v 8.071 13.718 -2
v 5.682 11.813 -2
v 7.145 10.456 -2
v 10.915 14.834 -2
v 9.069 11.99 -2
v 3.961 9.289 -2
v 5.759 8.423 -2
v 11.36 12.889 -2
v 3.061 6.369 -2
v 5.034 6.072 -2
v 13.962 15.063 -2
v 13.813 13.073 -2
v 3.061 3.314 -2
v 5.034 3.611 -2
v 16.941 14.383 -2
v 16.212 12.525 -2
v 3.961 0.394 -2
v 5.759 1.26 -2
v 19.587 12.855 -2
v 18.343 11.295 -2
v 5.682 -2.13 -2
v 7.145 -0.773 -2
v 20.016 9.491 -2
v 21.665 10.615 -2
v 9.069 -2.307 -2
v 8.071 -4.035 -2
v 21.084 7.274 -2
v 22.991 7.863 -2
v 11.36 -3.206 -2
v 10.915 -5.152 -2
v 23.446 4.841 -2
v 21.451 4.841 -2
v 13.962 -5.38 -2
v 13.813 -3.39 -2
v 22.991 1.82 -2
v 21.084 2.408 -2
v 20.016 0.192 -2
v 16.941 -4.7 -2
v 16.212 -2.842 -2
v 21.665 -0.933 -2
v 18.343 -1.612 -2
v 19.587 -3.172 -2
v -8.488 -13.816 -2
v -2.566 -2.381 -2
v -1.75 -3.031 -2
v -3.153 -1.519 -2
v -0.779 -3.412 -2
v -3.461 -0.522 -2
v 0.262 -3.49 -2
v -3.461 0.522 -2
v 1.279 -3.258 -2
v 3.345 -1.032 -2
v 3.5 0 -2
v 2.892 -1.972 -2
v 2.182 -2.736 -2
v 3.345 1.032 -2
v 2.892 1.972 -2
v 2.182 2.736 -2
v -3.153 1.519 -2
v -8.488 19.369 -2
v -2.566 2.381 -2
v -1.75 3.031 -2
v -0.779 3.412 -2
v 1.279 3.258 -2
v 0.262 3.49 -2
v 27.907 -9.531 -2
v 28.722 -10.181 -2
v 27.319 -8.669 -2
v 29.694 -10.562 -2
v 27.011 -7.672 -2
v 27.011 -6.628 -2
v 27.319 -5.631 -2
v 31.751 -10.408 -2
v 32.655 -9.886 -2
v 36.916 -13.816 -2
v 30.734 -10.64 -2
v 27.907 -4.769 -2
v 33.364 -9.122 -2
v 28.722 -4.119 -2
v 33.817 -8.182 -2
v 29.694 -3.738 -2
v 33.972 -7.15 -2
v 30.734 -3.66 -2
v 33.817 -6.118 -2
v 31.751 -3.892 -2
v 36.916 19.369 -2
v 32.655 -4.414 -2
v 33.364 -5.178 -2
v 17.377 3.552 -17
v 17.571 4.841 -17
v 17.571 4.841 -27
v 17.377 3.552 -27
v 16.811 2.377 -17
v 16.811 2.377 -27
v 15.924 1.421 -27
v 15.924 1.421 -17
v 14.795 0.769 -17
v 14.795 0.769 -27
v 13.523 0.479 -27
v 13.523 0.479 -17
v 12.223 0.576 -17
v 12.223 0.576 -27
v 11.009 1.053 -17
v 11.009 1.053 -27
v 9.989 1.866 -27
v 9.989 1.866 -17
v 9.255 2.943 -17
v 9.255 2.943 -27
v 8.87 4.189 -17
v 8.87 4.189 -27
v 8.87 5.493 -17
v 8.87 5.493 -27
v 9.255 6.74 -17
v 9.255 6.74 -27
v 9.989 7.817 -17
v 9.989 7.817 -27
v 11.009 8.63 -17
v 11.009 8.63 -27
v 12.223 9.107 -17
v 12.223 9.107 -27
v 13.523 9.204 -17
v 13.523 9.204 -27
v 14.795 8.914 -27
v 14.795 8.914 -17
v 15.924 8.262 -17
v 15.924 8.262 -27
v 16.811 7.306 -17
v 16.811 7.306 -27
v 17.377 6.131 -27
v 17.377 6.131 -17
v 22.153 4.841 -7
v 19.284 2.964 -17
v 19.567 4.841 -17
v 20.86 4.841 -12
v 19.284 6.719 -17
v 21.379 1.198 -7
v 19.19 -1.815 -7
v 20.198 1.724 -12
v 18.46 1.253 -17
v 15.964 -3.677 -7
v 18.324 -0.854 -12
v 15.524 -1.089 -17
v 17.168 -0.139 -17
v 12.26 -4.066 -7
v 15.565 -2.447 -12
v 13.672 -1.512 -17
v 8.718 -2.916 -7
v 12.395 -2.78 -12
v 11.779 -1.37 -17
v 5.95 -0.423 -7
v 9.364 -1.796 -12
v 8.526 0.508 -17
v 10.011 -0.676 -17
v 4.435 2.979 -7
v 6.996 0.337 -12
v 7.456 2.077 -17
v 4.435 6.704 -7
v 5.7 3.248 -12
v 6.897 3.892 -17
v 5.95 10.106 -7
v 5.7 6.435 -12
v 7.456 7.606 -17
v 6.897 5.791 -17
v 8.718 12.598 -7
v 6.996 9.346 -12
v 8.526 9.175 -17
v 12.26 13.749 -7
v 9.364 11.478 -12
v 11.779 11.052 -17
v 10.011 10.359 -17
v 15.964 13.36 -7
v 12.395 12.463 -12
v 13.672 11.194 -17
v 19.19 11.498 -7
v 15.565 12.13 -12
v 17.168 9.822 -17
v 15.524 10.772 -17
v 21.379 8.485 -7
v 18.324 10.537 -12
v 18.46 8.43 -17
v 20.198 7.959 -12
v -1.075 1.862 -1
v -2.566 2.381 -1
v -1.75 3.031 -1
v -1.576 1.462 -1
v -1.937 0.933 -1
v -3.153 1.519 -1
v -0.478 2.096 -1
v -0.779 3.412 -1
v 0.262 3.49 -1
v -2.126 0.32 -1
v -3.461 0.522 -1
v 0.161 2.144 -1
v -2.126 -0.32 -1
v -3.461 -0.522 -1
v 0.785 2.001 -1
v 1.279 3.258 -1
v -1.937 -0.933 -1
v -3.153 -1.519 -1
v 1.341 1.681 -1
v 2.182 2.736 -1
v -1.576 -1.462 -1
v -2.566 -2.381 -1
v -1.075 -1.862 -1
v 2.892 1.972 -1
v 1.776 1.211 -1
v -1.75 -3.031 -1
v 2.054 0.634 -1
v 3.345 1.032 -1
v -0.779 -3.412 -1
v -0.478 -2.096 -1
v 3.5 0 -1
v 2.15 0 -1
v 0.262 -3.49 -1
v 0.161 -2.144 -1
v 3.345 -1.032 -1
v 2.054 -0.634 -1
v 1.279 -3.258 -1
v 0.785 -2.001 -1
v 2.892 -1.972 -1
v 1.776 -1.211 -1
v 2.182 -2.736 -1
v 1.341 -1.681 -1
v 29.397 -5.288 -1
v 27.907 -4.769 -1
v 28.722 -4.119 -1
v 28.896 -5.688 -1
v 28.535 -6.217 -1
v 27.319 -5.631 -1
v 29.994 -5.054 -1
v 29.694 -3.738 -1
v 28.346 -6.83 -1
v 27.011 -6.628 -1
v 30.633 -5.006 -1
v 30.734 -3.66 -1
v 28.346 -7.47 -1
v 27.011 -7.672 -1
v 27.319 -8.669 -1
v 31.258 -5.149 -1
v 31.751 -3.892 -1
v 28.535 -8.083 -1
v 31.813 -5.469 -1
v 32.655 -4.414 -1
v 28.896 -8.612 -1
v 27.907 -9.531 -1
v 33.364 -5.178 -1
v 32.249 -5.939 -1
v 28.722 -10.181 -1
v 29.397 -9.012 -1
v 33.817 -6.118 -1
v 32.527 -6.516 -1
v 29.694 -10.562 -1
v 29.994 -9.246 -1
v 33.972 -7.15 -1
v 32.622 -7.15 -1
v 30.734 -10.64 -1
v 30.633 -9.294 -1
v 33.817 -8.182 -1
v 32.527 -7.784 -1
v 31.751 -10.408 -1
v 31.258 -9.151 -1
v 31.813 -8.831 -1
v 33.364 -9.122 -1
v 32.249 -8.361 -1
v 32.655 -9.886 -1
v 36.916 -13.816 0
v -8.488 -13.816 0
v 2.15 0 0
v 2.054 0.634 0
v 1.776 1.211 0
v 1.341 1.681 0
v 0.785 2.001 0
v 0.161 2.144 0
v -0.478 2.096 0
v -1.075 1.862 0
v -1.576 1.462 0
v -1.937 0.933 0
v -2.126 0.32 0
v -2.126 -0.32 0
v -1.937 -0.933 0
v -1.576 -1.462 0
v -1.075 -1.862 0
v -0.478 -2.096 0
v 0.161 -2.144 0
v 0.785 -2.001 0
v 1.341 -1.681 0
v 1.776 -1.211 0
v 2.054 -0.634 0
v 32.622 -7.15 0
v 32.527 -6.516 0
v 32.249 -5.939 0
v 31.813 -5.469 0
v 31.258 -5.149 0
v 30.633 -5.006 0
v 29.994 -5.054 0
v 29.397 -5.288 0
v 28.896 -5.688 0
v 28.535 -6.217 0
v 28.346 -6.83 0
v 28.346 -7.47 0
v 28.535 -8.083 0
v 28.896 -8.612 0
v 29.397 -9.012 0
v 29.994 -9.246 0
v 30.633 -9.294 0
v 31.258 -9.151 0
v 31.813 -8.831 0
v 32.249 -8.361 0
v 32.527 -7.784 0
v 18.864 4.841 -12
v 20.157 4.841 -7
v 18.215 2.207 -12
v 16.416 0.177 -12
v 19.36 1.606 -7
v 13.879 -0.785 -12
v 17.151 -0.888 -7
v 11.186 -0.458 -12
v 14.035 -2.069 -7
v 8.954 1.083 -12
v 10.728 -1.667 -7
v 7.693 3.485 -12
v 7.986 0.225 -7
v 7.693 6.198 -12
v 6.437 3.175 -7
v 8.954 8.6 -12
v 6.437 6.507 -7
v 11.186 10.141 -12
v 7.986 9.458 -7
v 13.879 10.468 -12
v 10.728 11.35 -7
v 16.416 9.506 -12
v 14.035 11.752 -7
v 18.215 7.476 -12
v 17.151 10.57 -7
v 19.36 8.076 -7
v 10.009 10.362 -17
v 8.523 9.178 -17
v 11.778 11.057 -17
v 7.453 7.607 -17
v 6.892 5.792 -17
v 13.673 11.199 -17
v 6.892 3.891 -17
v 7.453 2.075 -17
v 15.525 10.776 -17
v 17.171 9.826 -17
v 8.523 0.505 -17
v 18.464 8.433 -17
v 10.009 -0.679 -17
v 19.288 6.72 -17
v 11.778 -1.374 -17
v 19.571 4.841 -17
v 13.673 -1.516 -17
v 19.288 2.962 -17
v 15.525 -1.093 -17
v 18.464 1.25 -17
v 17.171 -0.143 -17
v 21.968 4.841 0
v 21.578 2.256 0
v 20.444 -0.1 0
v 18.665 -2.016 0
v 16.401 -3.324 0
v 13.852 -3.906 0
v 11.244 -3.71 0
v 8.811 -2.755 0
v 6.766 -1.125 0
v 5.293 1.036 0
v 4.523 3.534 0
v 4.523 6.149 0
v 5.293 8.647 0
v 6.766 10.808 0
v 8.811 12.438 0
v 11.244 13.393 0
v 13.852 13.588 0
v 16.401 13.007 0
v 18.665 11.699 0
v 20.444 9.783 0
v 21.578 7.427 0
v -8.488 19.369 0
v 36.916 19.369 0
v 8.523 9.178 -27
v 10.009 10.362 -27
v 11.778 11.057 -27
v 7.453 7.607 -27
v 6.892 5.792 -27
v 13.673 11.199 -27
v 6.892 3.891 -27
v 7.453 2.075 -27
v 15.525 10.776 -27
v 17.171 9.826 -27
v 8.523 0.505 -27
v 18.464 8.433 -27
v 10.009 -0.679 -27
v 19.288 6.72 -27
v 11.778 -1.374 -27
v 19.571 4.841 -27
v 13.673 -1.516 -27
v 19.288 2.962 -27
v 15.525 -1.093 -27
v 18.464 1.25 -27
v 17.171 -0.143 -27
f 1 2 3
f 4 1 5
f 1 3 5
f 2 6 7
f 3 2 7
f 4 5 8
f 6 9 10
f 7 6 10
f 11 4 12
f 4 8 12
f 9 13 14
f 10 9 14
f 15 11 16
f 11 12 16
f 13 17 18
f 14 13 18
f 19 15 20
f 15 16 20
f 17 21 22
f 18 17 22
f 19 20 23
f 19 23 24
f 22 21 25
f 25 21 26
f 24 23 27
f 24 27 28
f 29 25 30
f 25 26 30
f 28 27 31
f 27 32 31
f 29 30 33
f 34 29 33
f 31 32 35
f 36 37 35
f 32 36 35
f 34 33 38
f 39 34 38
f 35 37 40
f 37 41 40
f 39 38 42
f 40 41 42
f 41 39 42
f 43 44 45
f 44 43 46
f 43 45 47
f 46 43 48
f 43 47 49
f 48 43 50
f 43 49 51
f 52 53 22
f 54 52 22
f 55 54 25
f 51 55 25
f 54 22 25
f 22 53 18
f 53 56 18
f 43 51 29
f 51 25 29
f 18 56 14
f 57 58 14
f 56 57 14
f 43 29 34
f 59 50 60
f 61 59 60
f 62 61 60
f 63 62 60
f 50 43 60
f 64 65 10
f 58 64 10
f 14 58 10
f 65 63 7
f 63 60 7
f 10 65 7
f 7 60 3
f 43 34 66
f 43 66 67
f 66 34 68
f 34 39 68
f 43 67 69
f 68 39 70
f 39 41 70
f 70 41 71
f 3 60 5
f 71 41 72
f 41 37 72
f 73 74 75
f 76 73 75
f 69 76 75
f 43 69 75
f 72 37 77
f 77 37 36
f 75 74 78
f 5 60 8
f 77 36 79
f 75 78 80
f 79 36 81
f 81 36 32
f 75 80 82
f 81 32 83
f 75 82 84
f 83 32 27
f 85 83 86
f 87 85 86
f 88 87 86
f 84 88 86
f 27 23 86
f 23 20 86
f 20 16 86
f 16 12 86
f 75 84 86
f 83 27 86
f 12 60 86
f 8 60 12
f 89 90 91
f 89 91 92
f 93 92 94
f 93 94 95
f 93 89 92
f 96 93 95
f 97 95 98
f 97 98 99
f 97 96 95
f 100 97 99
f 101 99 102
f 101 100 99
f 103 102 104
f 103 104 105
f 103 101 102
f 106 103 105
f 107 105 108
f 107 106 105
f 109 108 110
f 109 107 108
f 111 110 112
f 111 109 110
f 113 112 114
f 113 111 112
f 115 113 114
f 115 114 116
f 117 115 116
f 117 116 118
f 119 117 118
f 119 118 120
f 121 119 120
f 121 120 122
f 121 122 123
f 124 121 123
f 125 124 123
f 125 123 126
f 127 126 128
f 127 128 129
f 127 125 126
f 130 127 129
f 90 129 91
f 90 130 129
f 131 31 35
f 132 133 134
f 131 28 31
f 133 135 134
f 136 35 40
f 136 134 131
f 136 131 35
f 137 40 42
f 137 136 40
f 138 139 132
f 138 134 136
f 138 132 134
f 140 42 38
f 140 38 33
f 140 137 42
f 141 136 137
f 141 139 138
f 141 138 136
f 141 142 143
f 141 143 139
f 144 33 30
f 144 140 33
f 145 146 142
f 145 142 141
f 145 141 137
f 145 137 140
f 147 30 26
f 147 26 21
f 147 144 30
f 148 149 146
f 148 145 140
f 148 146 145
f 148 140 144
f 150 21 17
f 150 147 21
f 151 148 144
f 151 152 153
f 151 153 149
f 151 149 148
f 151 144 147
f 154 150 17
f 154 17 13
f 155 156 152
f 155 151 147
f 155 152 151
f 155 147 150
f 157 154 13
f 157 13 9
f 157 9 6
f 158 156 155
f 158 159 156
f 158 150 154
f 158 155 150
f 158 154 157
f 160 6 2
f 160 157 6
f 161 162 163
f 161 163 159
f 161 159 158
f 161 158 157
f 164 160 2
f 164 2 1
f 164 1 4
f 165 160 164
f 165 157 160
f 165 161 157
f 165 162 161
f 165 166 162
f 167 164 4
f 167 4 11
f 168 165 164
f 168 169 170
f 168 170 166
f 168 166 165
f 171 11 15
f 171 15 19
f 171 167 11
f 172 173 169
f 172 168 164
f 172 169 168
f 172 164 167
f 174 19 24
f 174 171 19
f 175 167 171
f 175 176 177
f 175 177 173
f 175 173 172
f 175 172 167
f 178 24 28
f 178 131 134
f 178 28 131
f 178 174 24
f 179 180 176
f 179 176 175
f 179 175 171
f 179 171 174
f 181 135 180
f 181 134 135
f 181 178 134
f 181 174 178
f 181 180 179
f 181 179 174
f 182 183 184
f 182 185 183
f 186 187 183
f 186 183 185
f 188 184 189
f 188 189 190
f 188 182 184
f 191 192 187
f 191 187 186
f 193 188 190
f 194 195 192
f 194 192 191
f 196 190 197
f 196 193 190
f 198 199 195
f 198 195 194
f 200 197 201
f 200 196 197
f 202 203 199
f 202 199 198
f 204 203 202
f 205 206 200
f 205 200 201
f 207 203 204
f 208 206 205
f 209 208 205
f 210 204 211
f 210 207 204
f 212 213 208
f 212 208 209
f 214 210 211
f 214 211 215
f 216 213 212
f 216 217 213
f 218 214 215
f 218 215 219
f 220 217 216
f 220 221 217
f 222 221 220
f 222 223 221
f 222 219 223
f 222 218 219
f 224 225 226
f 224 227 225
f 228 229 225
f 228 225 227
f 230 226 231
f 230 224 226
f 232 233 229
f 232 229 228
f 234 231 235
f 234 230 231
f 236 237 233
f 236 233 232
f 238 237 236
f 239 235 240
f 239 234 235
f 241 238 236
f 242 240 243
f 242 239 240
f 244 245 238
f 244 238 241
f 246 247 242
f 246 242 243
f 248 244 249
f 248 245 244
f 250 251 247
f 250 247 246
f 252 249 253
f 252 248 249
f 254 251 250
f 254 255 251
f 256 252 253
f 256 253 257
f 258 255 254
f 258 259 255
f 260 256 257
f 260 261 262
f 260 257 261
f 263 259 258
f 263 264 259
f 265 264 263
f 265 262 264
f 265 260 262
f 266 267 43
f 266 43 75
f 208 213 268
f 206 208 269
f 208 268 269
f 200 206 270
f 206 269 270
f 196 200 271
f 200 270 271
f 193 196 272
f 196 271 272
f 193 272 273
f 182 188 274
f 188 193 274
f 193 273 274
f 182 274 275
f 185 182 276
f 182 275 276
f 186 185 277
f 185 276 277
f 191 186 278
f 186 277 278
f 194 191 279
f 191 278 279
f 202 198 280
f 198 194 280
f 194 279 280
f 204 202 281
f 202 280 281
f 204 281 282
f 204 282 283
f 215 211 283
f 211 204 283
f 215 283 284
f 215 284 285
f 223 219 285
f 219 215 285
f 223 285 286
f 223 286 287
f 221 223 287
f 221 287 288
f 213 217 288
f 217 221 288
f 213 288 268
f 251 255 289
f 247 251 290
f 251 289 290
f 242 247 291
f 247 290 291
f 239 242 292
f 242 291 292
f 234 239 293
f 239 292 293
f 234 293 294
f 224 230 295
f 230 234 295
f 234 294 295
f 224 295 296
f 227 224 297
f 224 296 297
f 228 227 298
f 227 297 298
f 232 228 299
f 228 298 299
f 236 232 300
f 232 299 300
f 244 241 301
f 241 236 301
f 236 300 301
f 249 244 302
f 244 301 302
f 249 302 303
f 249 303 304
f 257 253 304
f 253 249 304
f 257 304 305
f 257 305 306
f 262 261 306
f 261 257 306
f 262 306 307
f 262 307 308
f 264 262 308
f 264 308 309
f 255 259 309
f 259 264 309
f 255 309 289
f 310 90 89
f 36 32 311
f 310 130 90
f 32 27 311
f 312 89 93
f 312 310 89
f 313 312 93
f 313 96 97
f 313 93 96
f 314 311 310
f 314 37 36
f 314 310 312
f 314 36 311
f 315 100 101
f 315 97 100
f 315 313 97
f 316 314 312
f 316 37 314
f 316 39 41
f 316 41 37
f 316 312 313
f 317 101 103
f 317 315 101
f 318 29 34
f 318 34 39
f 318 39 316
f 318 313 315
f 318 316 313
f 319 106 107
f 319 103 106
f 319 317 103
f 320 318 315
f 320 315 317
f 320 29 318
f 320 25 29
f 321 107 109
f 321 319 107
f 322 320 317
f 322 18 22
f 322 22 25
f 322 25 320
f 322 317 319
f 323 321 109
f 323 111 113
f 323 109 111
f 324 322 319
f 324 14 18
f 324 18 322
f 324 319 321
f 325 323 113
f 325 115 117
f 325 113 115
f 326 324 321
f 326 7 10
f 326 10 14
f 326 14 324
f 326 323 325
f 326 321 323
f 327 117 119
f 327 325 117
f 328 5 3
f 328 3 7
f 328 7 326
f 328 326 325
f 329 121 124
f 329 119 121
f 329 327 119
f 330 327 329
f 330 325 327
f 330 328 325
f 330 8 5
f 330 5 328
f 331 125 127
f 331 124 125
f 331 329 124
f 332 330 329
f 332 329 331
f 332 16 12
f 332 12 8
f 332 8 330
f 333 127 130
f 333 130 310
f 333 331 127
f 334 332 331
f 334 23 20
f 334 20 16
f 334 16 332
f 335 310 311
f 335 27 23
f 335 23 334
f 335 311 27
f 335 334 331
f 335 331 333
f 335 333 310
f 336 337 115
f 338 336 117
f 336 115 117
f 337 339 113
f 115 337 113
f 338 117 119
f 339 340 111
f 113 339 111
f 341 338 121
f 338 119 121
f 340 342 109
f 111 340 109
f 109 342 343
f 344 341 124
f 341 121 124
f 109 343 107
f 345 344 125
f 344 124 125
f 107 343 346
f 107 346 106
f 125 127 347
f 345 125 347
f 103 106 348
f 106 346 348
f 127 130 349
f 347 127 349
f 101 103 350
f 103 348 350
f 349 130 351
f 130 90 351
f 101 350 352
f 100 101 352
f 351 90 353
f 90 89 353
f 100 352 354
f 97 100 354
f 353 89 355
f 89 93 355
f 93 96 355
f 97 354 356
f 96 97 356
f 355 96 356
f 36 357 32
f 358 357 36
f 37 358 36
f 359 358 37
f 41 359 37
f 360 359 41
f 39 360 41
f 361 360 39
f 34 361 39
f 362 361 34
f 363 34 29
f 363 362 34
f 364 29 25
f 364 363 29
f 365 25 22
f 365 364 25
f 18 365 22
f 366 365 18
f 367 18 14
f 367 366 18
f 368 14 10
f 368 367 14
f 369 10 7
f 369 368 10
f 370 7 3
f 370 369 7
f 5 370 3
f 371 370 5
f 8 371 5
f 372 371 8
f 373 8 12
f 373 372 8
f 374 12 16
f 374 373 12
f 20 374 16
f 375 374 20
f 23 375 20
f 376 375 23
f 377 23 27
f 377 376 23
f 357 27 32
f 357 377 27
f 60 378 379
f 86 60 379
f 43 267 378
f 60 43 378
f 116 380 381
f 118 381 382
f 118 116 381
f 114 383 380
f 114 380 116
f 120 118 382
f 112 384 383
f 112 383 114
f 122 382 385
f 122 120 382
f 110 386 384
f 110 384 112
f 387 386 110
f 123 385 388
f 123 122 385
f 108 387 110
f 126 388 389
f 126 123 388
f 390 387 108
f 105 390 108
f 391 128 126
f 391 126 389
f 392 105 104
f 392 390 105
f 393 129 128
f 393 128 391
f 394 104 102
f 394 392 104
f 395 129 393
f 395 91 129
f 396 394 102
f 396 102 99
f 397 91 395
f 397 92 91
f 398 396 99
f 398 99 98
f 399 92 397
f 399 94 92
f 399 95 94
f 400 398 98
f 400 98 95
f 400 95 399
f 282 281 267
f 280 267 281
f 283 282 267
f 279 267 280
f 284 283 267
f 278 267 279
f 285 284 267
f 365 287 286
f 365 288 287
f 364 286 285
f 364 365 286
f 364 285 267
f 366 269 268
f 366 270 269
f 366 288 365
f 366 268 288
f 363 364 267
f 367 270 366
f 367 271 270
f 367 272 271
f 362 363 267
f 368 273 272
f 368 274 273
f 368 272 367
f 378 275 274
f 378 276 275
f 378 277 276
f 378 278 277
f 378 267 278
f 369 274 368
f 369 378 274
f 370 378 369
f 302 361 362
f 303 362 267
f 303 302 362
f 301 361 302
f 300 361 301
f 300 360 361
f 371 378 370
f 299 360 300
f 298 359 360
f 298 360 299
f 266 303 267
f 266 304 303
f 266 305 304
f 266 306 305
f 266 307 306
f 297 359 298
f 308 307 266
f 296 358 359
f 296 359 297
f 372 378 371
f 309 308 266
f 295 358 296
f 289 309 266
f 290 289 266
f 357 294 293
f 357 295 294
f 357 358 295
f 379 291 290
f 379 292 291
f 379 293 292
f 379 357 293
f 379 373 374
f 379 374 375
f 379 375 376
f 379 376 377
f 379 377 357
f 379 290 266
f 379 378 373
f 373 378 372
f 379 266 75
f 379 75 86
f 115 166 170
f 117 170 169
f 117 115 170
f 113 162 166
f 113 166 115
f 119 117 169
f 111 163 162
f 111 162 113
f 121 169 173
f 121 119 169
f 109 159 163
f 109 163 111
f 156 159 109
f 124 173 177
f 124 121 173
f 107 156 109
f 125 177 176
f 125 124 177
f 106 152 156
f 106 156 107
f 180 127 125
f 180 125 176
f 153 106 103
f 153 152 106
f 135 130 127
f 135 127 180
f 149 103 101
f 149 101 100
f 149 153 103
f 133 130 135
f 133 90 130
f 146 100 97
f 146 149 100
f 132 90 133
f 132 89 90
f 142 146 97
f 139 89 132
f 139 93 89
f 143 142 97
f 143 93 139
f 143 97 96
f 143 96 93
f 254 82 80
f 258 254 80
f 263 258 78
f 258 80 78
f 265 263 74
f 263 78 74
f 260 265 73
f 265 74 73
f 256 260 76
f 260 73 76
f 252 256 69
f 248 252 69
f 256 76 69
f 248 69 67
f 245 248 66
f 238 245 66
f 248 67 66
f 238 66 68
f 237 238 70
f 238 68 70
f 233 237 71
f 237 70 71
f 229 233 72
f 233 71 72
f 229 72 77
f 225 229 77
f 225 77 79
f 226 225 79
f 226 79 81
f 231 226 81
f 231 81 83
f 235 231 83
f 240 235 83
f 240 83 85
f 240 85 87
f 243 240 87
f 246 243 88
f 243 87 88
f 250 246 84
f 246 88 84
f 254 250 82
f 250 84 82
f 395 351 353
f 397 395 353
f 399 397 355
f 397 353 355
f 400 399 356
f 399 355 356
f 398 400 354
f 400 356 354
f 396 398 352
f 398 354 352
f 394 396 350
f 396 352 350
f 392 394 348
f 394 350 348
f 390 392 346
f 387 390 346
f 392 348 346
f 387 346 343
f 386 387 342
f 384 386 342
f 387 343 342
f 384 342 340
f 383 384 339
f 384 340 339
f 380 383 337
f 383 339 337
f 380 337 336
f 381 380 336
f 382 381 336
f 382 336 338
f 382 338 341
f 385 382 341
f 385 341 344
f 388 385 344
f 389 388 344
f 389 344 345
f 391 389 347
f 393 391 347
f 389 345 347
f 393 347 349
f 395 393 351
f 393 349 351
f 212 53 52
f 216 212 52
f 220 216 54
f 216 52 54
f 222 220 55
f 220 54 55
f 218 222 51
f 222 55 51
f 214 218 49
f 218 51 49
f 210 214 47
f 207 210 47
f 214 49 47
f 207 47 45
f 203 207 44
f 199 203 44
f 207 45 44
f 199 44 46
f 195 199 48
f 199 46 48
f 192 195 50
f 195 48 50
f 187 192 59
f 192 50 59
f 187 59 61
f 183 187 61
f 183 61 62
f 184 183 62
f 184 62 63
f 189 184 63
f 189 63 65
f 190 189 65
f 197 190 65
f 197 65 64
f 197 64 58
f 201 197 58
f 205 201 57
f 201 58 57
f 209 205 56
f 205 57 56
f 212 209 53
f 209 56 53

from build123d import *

# Parameters (mm, degrees)
F0_W     = 45.4043811187
F0_H     = 33.1850759685
F0_R     = 2.15
F0_W_2   = 11.5
F0_H_2   = 11.5
F1_DEPTH = 2
F2_R     = 3.5
F2_R_2   = 2.15
F3_DEPTH = 1
F6_R     = 6.375
F6_R_2   = 4.375
F7_DEPTH = 10
F4_R     = 10.25
F4_R_2   = 8.25
F4_W     = 11.5
F4_H     = 11.5
F8_DEPTH = 15
F8_TAPER = 14.5
F9_DEPTH = 17
F9_TAPER = -14.5


with BuildPart() as f1:
    # F0 (on Top) → F1 (new body)
    with BuildSketch(Plane.XY):
        with Locations((14.2143075354, 2.7766618878)):
            Rectangle(F0_W, F0_H)
        Circle(F0_R, mode=Mode.SUBTRACT)
        with Locations((30.4724055499, -7.15)):
            Circle(F0_R, mode=Mode.SUBTRACT)
        with Locations((13.14, 4.9)):
            Rectangle(F0_W_2, F0_H_2, mode=Mode.SUBTRACT)
    extrude(amount=-F1_DEPTH)

    # F2 (on face) → F3 (cut)
    with BuildSketch(Plane(origin=(0, 0, -2), x_dir=(1, 0, 0), z_dir=(0, 0, -1))):
        with Locations((30.4724055499, 7.15)):
            Circle(F2_R)
        with Locations((30.4724055499, 7.15)):
            Circle(F2_R_2, mode=Mode.SUBTRACT)
        Circle(F2_R)
        Circle(F2_R_2, mode=Mode.SUBTRACT)
    extrude(amount=-F3_DEPTH, mode=Mode.SUBTRACT)


with BuildPart() as f7:
    # F6 (on offset) → F7 (new body)
    with BuildSketch(Plane(origin=(0, 0, -17), x_dir=(1, 0, 0), z_dir=(0, 0, -1))):
        with Locations((13.1962522864, -4.8414133489)):
            Circle(F6_R)
        with Locations((13.1962522864, -4.8414133489)):
            Circle(F6_R_2, mode=Mode.SUBTRACT)
    extrude(amount=F7_DEPTH)


with BuildPart() as f8:
    # F4 (on face) → F8 (new body)
    with BuildSketch(Plane(origin=(0, 0, -2), x_dir=(1, 0, 0), z_dir=(0, 0, -1))):
        with Locations((13.1962522864, -4.8414133489)):
            Circle(F4_R)
        with Locations((13.1962522864, -4.8414133489)):
            Circle(F4_R_2, mode=Mode.SUBTRACT)
        with Locations((13.1962522864, -4.8414133489)):
            Circle(F4_R_2)
        with Locations((13.14, -4.9)):
            Rectangle(F4_W, F4_H, mode=Mode.SUBTRACT)
        with Locations((13.14, -4.9)):
            Rectangle(F4_W, F4_H)
    extrude(amount=F8_DEPTH, taper=F8_TAPER)


with BuildPart() as f9_tool:
    # F6 (on offset) → F9 (new body, through all)
    with BuildSketch(Plane(origin=(0, 0, -17), x_dir=(1, 0, 0), z_dir=(0, 0, -1))):
        with Locations((13.1962522864, -4.8414133489)):
            Circle(F6_R_2)
    extrude(amount=-F9_DEPTH, taper=F9_TAPER)


with BuildPart() as f1_1:
    add(f1.part)

    # F9: cut by f9_tool
    add(f9_tool.part, mode=Mode.SUBTRACT)


with BuildPart() as f8_1:
    add(f8.part)

    # F9: cut by f9_tool
    add(f9_tool.part, mode=Mode.SUBTRACT)


solid = Compound([f7.part, f1_1.part, f8_1.part])
